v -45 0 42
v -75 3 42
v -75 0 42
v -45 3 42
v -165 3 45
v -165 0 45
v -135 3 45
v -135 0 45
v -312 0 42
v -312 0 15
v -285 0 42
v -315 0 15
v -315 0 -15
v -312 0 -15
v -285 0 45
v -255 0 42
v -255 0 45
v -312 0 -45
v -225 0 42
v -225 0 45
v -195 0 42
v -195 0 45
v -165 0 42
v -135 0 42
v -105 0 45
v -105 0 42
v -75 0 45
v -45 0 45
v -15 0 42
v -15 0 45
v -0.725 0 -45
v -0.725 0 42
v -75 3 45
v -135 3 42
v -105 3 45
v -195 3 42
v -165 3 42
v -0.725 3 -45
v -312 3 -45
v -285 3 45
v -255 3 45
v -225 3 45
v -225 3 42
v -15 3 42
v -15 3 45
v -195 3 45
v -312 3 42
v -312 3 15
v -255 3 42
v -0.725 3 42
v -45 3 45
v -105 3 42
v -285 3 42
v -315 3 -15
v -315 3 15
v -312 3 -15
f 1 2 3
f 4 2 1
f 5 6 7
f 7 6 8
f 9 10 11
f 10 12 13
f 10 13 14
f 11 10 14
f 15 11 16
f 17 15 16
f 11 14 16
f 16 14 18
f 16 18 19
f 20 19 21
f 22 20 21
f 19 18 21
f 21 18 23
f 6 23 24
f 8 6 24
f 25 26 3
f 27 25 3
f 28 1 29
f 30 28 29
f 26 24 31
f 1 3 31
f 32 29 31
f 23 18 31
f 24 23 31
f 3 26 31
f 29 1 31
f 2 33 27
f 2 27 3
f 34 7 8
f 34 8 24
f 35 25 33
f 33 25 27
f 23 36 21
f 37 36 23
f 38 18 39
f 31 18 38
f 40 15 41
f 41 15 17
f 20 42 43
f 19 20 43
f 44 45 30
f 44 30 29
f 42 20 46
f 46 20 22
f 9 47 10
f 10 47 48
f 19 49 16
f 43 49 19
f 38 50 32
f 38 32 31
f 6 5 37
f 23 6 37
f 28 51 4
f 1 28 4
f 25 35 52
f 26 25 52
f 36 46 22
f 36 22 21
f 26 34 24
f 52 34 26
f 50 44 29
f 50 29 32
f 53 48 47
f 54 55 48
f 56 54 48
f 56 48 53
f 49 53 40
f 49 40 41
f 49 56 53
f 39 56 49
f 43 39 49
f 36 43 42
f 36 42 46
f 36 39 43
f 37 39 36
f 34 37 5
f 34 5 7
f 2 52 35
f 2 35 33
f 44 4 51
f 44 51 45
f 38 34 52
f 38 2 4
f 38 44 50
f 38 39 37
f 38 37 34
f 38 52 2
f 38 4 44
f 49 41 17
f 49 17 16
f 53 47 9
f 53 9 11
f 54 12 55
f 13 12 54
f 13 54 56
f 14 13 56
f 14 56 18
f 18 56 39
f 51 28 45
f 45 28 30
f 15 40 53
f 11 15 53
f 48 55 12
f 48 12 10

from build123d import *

# Parameters (mm, degrees)
SKETCH1_W           = 630
SKETCH1_H           = 90
BOSS_EXTRUDE1_DEPTH = 3
SKETCH3_W           = 30
SKETCH3_H           = 3
CUT_EXTRUDE1_DEPTH  = 3
LPATTERN1_COUNT     = 10
LPATTERN1_PITCH     = 60
LPATTERN1_COL_COUNT = 2
LPATTERN1_COL_PITCH = 60
SKETCH7_W           = 3
SKETCH7_H           = 30
CUT_EXTRUDE3_DEPTH  = 3
SKETCH13_W          = 3
SKETCH13_H          = 27
CUT_EXTRUDE4_DEPTH  = 10


with BuildPart() as part:
    # Sketch1 → Boss-Extrude1 (new body)
    with BuildSketch(Plane(origin=(0, 0, 0), x_dir=(1, 0, 0), z_dir=(0, 1, 0))):
        Rectangle(SKETCH1_W, SKETCH1_H)
    extrude(amount=BOSS_EXTRUDE1_DEPTH)

    # Sketch3 → Cut-Extrude1 (cut)
    with BuildSketch(Plane(origin=(0, 3, 0), x_dir=(1, 0, 0), z_dir=(0, 1, 0))):
        with Locations((-240, -43.5)):
            Rectangle(SKETCH3_W, SKETCH3_H)
    cut_extrude1 = extrude(amount=-CUT_EXTRUDE1_DEPTH, mode=Mode.SUBTRACT)

    # LPattern1: Cut-Extrude1 ×10
    with Locations(*[(i * LPATTERN1_PITCH, 0, 0) for i in range(1, LPATTERN1_COUNT)]):
        add(cut_extrude1, mode=Mode.SUBTRACT)

    # LPattern1 col: Cut-Extrude1 ×2
    with Locations(*[(-i * LPATTERN1_COL_PITCH, 0, 0) for i in range(1, LPATTERN1_COL_COUNT)]):
        add(cut_extrude1, mode=Mode.SUBTRACT)

    # Sketch7 → Cut-Extrude3 (cut)
    with BuildSketch(Plane(origin=(0, 3, 0), x_dir=(1, 0, 0), z_dir=(0, 1, 0))):
        with Locations((-313.5, 30)):
            Rectangle(SKETCH7_W, SKETCH7_H)
    extrude(amount=-CUT_EXTRUDE3_DEPTH, mode=Mode.SUBTRACT)

    # Sketch13 → Cut-Extrude4 (cut)
    with BuildSketch(Plane(origin=(0, 3, 0), x_dir=(1, 0, 0), z_dir=(0, 1, 0))):
        with Locations((-313.5, -28.5)):
            Rectangle(SKETCH13_W, SKETCH13_H)
    extrude(amount=-CUT_EXTRUDE4_DEPTH, mode=Mode.SUBTRACT)

    # SurfaceCut1
    split(bisect_by=Plane(origin=(-0.725, 0, 0), x_dir=(0, 0, -1), z_dir=(1, 0, 0)), keep=Keep.BOTTOM)


solid = part.part
